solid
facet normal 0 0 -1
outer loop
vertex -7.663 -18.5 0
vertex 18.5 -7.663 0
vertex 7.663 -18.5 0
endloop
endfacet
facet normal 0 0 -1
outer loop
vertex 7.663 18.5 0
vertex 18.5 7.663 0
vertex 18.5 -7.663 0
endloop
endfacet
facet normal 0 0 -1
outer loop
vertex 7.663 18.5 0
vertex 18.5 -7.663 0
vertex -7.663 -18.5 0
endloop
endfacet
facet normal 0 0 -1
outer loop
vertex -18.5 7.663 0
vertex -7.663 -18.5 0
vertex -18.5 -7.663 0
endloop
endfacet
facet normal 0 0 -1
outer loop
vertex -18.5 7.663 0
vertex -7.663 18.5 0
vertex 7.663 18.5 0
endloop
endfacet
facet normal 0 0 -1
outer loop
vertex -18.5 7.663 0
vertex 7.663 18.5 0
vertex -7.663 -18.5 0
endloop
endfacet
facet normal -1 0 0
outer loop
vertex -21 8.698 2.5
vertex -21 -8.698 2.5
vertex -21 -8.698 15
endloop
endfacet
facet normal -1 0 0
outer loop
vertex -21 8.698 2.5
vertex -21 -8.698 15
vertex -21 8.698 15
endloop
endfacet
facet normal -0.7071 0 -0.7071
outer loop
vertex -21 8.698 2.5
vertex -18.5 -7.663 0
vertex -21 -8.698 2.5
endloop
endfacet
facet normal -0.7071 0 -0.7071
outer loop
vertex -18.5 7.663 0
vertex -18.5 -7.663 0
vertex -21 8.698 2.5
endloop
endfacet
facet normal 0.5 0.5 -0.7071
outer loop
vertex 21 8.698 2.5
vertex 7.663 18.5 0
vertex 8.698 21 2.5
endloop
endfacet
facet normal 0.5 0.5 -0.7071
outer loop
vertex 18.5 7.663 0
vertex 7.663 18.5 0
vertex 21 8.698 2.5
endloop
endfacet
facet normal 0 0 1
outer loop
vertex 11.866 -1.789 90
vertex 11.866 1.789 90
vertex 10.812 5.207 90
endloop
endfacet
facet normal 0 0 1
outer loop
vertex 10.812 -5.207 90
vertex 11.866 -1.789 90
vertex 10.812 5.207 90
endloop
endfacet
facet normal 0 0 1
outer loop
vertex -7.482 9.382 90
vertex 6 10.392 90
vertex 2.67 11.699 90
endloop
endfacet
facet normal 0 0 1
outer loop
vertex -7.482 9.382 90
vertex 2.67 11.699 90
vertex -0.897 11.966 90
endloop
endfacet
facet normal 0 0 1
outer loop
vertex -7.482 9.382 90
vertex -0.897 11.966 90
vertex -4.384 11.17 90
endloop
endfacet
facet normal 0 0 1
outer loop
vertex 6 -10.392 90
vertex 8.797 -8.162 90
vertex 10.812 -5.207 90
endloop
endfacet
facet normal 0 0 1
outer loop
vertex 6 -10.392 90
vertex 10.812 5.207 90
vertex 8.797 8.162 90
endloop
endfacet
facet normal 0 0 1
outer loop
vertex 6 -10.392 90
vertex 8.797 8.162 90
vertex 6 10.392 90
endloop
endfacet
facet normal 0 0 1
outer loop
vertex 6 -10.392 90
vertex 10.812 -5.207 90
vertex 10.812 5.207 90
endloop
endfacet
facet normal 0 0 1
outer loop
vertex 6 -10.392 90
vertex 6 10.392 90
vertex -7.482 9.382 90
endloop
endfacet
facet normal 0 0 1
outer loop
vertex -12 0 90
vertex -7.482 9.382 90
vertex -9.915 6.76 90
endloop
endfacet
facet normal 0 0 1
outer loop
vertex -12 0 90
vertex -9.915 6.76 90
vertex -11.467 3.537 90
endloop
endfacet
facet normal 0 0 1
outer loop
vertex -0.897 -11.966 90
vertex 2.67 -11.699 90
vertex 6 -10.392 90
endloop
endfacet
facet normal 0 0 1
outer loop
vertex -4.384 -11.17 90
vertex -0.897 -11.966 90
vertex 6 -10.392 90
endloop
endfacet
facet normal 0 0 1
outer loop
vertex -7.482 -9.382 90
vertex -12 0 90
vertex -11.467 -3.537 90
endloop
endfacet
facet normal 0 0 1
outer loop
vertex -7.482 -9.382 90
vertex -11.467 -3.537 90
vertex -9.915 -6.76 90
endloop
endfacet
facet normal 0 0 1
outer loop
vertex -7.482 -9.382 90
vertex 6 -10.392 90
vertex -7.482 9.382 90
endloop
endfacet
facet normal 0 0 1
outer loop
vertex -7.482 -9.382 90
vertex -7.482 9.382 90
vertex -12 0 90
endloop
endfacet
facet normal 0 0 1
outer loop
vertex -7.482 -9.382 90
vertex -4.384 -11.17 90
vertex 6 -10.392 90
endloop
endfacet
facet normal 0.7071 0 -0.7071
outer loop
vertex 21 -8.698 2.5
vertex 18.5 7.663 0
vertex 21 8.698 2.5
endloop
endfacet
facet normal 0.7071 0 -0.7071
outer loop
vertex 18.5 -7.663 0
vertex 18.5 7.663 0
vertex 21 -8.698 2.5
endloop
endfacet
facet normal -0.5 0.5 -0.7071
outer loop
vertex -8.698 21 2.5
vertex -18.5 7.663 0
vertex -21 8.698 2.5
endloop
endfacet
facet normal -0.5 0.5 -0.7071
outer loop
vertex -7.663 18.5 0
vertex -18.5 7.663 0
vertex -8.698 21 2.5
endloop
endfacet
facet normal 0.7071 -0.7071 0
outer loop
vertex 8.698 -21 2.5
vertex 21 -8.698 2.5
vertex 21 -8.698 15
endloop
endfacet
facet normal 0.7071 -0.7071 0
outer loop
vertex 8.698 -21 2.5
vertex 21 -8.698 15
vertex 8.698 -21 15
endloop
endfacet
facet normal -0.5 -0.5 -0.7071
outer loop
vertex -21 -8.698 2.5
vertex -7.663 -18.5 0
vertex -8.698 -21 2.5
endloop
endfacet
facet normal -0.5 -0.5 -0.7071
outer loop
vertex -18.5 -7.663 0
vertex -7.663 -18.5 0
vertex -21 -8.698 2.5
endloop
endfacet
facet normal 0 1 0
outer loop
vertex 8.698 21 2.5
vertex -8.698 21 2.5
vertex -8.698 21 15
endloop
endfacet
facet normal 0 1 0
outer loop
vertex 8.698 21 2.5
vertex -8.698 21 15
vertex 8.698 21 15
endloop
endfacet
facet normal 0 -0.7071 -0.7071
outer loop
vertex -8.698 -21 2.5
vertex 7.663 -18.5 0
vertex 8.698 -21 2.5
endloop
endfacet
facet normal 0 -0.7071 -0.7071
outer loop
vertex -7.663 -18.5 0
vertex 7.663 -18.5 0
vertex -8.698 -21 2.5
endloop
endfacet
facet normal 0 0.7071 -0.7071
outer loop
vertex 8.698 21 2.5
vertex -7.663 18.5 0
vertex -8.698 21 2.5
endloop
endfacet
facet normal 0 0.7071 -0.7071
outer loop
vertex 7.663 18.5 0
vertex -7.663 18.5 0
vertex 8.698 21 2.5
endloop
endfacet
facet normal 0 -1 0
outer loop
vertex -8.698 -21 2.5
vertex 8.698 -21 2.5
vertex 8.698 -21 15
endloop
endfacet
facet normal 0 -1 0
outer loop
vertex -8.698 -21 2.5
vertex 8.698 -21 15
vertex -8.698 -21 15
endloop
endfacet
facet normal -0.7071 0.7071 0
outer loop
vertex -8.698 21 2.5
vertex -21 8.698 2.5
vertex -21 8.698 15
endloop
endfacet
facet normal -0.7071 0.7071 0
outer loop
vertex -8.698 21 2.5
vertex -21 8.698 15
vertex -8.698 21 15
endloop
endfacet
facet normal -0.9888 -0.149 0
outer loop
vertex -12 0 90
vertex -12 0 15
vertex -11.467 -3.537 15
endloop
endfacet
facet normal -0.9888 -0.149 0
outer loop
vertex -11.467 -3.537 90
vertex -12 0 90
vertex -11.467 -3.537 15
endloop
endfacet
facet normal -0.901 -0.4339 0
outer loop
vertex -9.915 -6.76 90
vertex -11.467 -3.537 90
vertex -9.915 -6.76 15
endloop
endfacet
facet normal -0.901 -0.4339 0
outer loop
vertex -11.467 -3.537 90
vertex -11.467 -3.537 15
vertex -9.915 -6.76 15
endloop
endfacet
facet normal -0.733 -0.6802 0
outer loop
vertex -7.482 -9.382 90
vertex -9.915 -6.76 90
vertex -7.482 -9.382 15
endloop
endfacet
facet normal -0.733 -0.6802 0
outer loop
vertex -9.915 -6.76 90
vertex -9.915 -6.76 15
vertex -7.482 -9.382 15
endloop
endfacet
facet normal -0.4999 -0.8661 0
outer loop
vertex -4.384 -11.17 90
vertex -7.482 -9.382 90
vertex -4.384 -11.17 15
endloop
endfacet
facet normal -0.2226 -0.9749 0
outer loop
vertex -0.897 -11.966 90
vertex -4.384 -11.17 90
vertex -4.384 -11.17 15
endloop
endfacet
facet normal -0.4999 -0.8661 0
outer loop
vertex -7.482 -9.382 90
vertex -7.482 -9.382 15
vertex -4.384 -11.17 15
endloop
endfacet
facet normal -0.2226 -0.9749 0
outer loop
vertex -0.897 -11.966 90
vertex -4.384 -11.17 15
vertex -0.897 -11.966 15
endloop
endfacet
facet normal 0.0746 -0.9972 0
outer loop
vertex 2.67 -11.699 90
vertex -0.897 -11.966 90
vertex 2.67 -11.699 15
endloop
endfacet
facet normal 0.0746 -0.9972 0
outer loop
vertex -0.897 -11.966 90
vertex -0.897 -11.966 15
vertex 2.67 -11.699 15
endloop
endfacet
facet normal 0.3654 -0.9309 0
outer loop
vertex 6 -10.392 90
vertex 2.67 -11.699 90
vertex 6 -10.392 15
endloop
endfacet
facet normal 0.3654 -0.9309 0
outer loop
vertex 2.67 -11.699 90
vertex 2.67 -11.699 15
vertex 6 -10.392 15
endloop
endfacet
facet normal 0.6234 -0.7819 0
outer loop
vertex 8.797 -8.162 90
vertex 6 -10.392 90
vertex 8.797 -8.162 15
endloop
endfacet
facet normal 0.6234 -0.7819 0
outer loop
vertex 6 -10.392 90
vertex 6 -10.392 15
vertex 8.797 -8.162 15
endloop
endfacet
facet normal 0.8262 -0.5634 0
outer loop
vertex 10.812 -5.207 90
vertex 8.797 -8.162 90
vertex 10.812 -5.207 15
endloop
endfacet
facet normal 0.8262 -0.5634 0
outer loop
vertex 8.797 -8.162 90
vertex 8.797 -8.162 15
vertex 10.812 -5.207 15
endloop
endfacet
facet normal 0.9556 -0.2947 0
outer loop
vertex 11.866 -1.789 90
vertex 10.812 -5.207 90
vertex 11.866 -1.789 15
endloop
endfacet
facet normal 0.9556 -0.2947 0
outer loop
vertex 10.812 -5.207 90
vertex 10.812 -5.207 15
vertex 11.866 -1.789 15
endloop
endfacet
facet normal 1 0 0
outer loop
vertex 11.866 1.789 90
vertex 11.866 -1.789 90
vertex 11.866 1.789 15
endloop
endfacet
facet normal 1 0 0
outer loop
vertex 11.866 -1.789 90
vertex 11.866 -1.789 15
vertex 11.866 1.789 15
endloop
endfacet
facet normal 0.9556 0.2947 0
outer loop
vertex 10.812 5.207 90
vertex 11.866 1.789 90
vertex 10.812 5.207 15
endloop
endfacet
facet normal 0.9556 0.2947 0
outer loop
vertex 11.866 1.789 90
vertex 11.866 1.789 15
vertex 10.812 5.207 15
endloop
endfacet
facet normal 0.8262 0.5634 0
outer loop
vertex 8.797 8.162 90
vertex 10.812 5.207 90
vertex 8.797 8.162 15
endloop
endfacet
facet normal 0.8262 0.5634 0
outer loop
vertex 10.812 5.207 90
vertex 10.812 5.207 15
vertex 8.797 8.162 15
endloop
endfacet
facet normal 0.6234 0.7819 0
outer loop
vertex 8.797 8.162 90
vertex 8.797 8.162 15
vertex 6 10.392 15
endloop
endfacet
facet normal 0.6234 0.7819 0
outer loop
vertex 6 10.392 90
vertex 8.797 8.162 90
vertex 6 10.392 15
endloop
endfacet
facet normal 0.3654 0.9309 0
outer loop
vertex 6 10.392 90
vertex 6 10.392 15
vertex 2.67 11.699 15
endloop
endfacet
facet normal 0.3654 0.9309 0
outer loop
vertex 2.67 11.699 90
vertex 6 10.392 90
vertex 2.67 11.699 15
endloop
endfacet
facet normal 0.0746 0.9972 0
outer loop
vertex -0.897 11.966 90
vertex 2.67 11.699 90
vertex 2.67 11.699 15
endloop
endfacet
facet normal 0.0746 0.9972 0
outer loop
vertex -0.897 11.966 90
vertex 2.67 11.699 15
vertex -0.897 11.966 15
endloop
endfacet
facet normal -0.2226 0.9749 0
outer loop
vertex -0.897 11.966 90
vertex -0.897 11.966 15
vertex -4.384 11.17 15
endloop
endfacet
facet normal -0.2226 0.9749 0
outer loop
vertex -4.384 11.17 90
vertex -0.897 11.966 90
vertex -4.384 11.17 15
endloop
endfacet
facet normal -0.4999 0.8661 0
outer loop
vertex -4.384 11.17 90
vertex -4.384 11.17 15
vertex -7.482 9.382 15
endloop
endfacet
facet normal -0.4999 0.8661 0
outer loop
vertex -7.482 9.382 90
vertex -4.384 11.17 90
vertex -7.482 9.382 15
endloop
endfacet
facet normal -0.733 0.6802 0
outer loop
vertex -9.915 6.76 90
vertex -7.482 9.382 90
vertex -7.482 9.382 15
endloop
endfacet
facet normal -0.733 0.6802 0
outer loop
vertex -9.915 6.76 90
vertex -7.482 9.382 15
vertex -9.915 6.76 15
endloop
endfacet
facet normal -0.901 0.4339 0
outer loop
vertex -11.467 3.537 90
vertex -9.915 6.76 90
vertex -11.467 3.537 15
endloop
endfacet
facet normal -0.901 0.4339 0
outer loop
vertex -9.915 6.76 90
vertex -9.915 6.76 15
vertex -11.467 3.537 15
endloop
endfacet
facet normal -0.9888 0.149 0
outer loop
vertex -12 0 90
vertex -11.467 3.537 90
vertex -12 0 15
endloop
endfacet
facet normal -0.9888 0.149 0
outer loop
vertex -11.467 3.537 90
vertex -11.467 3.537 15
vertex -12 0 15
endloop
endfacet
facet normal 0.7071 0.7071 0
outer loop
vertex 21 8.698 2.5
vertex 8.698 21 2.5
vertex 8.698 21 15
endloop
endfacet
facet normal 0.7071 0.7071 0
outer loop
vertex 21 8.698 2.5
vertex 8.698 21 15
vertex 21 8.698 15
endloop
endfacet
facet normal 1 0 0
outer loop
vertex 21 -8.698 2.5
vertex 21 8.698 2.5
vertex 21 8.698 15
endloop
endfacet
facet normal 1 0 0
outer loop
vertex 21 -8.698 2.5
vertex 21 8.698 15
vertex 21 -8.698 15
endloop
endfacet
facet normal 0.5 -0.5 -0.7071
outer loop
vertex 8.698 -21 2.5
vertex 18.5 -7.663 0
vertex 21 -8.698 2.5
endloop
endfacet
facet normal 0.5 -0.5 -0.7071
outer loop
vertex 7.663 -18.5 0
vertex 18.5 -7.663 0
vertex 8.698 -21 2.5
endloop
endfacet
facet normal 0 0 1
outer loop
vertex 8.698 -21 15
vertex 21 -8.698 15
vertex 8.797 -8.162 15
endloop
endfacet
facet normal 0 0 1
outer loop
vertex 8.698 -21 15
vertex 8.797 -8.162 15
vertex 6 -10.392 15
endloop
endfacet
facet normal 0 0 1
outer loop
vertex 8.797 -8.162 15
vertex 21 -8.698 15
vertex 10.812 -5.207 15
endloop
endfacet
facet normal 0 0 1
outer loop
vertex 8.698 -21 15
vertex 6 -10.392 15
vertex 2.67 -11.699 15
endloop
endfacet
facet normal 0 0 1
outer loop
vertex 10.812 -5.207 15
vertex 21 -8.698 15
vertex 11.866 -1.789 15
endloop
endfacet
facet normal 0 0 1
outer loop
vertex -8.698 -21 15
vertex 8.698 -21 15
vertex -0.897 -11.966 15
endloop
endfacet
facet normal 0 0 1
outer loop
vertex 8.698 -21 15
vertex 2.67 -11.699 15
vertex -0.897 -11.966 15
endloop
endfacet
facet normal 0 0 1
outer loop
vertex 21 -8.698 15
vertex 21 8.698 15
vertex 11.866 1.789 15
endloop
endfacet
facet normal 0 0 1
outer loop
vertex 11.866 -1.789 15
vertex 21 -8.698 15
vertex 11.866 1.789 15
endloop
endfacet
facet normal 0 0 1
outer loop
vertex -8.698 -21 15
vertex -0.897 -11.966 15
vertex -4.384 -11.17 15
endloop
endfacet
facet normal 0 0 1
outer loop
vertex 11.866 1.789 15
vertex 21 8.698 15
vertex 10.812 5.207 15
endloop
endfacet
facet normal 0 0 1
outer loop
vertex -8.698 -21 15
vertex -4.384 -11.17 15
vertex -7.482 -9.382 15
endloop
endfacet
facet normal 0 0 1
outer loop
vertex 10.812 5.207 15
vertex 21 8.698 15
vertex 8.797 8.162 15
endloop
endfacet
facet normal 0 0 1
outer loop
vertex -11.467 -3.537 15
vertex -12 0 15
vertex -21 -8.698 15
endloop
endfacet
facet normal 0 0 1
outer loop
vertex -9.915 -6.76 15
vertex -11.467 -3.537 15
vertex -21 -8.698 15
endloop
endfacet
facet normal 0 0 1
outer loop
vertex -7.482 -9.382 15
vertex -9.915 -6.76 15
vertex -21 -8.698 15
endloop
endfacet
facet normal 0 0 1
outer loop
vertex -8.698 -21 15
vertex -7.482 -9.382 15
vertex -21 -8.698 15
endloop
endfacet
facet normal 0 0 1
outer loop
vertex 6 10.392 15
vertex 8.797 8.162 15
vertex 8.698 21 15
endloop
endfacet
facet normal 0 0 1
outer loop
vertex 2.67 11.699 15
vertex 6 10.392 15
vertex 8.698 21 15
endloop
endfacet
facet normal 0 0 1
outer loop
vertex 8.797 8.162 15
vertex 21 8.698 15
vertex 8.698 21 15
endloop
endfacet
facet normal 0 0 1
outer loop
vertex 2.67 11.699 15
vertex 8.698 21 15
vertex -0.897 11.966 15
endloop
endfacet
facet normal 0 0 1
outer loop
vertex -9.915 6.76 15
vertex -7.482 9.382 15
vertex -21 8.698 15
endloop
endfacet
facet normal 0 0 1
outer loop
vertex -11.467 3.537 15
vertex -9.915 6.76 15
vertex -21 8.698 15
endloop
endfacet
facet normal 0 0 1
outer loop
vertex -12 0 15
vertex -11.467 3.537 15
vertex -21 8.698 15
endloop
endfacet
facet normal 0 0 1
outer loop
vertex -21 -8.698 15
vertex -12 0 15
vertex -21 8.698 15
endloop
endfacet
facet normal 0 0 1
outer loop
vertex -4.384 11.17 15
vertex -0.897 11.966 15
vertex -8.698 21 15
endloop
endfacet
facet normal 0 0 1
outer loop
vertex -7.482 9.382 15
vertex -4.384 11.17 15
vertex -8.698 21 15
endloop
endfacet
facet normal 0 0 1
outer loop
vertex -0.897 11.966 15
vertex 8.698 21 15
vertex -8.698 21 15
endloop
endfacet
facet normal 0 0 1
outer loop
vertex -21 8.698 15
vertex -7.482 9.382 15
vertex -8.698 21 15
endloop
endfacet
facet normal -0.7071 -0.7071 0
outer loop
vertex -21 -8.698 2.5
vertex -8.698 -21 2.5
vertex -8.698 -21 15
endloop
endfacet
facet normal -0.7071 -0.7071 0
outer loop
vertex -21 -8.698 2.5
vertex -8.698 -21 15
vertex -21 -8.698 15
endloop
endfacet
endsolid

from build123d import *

# Parameters (mm, degrees)
EXTRUDE2_DEPTH = 15
CHAMFER3_SIZE  = 2.5
SKETCH3_R      = 12
EXTRUDE3_DEPTH = 75


with BuildPart() as part:
    # Sketch2 → Extrude2 (new body)
    with BuildSketch(Plane.XY):
        Polygon((-21, 8.69848481), (-8.69848481, 21), (8.69848481, 21), (21, 8.69848481), (21, -8.69848481), (8.69848481, -21), (-8.69848481, -21), (-21, -8.69848481), align=None)
    extrude(amount=EXTRUDE2_DEPTH)

    # Chamfer3
    chamfer3_edges = [part.edges().sort_by_distance(p)[0] for p in [
        (14.849242405, 14.849242405, 0),
        (21, 0, 0),
        (14.849242405, -14.849242405, 0),
        (0, -21, 0),
        (-14.849242405, -14.849242405, 0),
        (-21, 0, 0),
        (-14.849242405, 14.849242405, 0),
        (0, 21, 0),
    ]]
    chamfer(chamfer3_edges, length=CHAMFER3_SIZE)

    # Sketch3 → Extrude3 (add)
    with BuildSketch(Plane.XY.offset(15)):
        with Locations(Location((0, 0, 0), (0, 0, 180))):
            Circle(SKETCH3_R)
    extrude(amount=EXTRUDE3_DEPTH)


solid = part.part
